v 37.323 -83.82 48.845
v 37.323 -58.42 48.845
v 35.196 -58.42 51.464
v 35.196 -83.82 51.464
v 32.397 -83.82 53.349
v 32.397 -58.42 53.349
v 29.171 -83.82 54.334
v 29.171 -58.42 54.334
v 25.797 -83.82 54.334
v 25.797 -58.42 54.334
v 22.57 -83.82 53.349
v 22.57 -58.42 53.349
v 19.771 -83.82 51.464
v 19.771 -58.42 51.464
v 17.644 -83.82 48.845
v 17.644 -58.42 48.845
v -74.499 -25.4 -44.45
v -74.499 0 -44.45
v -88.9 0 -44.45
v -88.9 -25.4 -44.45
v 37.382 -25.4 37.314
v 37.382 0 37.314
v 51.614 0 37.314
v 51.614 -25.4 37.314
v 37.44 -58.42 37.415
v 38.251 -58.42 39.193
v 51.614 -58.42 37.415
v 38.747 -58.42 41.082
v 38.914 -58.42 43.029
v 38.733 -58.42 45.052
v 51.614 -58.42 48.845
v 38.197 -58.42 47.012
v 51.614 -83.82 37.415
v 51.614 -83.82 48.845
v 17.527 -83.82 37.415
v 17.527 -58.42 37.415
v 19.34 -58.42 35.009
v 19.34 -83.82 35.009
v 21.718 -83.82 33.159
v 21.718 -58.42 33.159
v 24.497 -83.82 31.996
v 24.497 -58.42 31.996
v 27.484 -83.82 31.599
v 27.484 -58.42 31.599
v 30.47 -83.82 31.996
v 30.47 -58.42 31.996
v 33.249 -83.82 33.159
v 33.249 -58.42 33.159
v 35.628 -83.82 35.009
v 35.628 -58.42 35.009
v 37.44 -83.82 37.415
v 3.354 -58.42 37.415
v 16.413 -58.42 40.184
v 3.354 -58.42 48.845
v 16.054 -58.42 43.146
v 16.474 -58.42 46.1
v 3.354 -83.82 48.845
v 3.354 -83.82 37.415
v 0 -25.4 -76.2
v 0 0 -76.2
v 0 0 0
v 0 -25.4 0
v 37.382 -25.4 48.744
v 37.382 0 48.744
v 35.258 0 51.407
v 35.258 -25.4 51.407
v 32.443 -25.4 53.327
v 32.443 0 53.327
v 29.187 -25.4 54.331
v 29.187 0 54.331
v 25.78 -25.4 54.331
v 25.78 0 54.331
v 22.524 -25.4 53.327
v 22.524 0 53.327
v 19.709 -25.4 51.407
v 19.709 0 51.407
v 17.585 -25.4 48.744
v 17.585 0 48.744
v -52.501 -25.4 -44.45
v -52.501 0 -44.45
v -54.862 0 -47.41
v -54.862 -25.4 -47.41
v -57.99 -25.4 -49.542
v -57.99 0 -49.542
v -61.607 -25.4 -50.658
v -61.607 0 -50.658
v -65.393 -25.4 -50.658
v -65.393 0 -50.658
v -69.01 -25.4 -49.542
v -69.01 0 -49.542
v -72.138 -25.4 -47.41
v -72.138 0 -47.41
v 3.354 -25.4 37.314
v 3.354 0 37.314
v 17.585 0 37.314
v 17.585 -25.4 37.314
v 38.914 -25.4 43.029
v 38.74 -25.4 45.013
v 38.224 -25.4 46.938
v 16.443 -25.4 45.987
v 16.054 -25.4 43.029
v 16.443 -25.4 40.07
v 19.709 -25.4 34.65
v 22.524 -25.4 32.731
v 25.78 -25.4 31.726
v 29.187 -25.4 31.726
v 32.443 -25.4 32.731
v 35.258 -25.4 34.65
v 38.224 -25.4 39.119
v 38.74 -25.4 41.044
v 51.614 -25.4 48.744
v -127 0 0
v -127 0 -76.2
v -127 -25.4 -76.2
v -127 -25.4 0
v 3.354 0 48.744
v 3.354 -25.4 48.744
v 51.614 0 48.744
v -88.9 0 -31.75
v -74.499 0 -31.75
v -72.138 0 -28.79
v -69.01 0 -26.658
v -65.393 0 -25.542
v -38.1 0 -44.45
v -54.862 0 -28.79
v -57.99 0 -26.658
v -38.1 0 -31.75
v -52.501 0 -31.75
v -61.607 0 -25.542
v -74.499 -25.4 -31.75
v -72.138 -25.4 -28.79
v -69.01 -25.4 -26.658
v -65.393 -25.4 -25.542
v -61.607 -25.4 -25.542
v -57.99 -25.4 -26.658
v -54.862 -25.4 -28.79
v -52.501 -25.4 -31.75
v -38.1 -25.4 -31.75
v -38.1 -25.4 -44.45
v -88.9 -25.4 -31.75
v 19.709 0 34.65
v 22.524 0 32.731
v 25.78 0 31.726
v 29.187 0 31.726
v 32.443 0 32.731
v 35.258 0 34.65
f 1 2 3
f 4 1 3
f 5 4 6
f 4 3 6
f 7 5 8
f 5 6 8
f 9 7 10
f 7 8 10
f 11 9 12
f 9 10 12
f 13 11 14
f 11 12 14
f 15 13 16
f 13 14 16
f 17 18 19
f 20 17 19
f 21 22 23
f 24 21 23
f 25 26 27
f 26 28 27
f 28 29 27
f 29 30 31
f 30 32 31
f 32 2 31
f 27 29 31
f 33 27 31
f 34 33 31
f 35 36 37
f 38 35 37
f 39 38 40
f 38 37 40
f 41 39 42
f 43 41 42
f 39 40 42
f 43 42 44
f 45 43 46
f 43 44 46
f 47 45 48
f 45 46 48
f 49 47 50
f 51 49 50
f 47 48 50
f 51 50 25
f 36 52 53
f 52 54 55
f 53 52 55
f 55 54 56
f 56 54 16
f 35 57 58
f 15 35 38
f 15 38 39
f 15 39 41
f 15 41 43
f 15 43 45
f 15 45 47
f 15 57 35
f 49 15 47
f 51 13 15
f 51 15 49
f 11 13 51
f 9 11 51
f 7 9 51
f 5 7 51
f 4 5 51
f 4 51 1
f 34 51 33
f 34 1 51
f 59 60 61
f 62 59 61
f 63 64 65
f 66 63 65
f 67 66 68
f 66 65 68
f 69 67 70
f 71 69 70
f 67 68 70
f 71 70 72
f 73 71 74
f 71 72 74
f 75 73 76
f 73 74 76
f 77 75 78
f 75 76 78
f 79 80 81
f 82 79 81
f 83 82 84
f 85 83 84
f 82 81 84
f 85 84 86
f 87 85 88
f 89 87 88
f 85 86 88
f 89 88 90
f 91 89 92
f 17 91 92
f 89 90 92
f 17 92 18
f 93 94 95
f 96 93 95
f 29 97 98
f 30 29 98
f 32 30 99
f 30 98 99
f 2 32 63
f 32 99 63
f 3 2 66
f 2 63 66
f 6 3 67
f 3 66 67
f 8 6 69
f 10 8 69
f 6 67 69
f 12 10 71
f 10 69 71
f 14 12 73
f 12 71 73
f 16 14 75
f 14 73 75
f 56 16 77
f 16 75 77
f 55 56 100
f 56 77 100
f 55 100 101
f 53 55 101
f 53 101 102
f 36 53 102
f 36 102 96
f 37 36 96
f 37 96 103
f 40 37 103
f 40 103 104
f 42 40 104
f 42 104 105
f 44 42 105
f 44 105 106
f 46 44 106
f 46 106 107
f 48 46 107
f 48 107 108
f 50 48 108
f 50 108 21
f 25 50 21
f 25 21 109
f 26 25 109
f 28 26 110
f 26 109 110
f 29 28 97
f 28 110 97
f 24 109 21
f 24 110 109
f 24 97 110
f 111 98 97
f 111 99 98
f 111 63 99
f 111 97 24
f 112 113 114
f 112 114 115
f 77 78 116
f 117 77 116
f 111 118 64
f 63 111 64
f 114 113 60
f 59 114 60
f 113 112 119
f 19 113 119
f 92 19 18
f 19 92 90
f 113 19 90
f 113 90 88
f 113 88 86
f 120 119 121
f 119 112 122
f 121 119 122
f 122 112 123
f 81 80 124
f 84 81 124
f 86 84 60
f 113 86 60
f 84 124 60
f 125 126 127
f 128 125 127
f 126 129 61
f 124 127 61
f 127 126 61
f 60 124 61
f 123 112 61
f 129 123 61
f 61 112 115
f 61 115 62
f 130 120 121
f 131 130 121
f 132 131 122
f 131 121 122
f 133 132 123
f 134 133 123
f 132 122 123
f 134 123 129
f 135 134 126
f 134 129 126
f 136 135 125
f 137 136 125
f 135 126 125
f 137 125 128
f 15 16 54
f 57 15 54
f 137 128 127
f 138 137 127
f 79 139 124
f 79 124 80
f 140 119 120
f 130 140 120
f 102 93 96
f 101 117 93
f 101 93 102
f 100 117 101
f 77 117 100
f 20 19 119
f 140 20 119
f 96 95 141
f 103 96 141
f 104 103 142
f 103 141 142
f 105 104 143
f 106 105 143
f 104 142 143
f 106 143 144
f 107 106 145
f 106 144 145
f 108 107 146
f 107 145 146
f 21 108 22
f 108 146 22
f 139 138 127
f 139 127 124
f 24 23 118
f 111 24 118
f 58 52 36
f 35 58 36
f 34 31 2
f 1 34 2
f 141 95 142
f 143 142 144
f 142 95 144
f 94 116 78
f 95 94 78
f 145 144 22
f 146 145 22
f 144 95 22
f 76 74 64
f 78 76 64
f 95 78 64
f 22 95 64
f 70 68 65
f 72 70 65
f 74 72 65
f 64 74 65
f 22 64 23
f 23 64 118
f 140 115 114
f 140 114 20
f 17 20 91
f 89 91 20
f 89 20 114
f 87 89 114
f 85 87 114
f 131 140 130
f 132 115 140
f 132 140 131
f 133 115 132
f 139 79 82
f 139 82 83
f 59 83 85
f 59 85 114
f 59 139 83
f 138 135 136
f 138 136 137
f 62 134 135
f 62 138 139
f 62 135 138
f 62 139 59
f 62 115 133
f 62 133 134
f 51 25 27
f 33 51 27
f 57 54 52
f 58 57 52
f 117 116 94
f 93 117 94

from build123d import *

# Parameters (mm, degrees)
F0_W     = 127
F0_H     = 76.2
F1_DEPTH = 25.4
F2_DEPTH = 25.4
F4_DEPTH = 25.4
F5_R     = 11.43
F6_DEPTH = 33.02
F8_DEPTH = 25.4


with BuildPart() as f1:
    # F0 (on Front) → F1 (new body)
    with BuildSketch(Plane.XZ):
        with Locations((-63.5, -38.1)):
            Rectangle(F0_W, F0_H)
        with BuildLine():
            ThreePointArc((-74.4985226281, -31.75), (-63.5, -25.4), (-52.5014773719, -31.75))
            Line((-52.5014773719, -31.75), (-38.1, -31.75))
            Line((-38.1, -31.75), (-38.1, -44.45))
            Line((-38.1, -44.45), (-52.5014773719, -44.45))
            ThreePointArc((-52.5014773719, -44.45), (-63.5, -50.8), (-74.4985226281, -44.45))
            Line((-74.4985226281, -44.45), (-88.9, -44.45))
            Line((-88.9, -44.45), (-88.9, -31.75))
            Line((-88.9, -31.75), (-74.4985226281, -31.75))
        make_face(mode=Mode.SUBTRACT)
    extrude(amount=F1_DEPTH)

    # F0 (on Front) → F2 (join)
    with BuildSketch(Plane.XZ):
        with Locations((-63.5, -38.1)):
            Rectangle(F0_W, F0_H)
        with BuildLine():
            ThreePointArc((-74.4985226281, -31.75), (-63.5, -25.4), (-52.5014773719, -31.75))
            Line((-52.5014773719, -31.75), (-38.1, -31.75))
            Line((-38.1, -31.75), (-38.1, -44.45))
            Line((-38.1, -44.45), (-52.5014773719, -44.45))
            ThreePointArc((-52.5014773719, -44.45), (-63.5, -50.8), (-74.4985226281, -44.45))
            Line((-74.4985226281, -44.45), (-88.9, -44.45))
            Line((-88.9, -44.45), (-88.9, -31.75))
            Line((-88.9, -31.75), (-74.4985226281, -31.75))
        make_face(mode=Mode.SUBTRACT)
    extrude(amount=F2_DEPTH)


with BuildPart() as f4:
    # F3 (on Front) → F4 (new body)
    with BuildSketch(Plane.XZ):
        with BuildLine():
            ThreePointArc((37.3822628393, 48.7436810958), (38.5241246685, 45.9869827814), (38.913592474, 43.0286810958))
            ThreePointArc((38.913592474, 43.0286810958), (38.5241246685, 40.0703794103), (37.3822628393, 37.3136810958))
            Line((37.3822628393, 37.3136810958), (51.613592474, 37.3136810958))
            Line((51.613592474, 37.3136810958), (51.613592474, 48.7436810958))
            Line((51.613592474, 48.7436810958), (37.3822628393, 48.7436810958))
        make_face()
        with BuildLine():
            Line((17.5849221088, 48.7436810958), (37.3822628393, 48.7436810958))
            ThreePointArc((37.3822628393, 48.7436810958), (27.483592474, 54.4586810958), (17.5849221088, 48.7436810958))
        make_face()
        with BuildLine():
            ThreePointArc((17.5849221088, 37.3136810958), (27.483592474, 31.5986810958), (37.3822628393, 37.3136810958))
            Line((37.3822628393, 37.3136810958), (17.5849221088, 37.3136810958))
        make_face()
        with BuildLine():
            ThreePointArc((37.3822628393, 37.3136810958), (38.5241246685, 40.0703794103), (38.913592474, 43.0286810958))
            ThreePointArc((38.913592474, 43.0286810958), (38.5241246685, 45.9869827814), (37.3822628393, 48.7436810958))
            Line((37.3822628393, 48.7436810958), (17.5849221088, 48.7436810958))
            ThreePointArc((17.5849221088, 48.7436810958), (16.053592474, 43.0286810958), (17.5849221088, 37.3136810958))
            Line((17.5849221088, 37.3136810958), (37.3822628393, 37.3136810958))
        make_face()
        with BuildLine():
            ThreePointArc((17.5849221088, 37.3136810958), (16.053592474, 43.0286810958), (17.5849221088, 48.7436810958))
            Line((17.5849221088, 48.7436810958), (3.353592474, 48.7436810958))
            Line((3.353592474, 48.7436810958), (3.353592474, 37.3136810958))
            Line((3.353592474, 37.3136810958), (17.5849221088, 37.3136810958))
        make_face()
    extrude(amount=F4_DEPTH)

    # F5 (on face) → F6 (join)
    with BuildSketch(Plane.XZ.offset(25.4)):
        with Locations((27.483592474, 43.0286810958)):
            Circle(F5_R)
    extrude(amount=F6_DEPTH)

    # F7 (on face) → F8 (join)
    with BuildSketch(Plane.XZ.offset(58.42)):
        with BuildLine():
            Line((51.613592474, 48.845155419), (37.3229789614, 48.845155419))
            ThreePointArc((37.3229789614, 48.845155419), (38.5087701948, 46.0437028577), (38.913592474, 43.0286810958))
            ThreePointArc((38.913592474, 43.0286810958), (38.5390993046, 40.1268422444), (37.4401596272, 37.415155419))
            Line((37.4401596272, 37.415155419), (51.613592474, 37.415155419))
            Line((51.613592474, 37.415155419), (51.613592474, 48.845155419))
        make_face()
        with BuildLine():
            ThreePointArc((17.5270253208, 37.415155419), (16.0541930963, 43.1458556041), (17.6442059867, 48.845155419))
            Line((17.6442059867, 48.845155419), (3.353592474, 48.845155419))
            Line((3.353592474, 48.845155419), (3.353592474, 37.415155419))
            Line((3.353592474, 37.415155419), (17.5270253208, 37.415155419))
        make_face()
        with BuildLine():
            ThreePointArc((38.913592474, 43.0286810958), (38.5087701948, 46.0437028577), (37.3229789614, 48.845155419))
            ThreePointArc((37.3229789614, 48.845155419), (27.483592474, 54.4586810958), (17.6442059867, 48.845155419))
            ThreePointArc((17.6442059867, 48.845155419), (16.0541930963, 43.1458556041), (17.5270253208, 37.415155419))
            ThreePointArc((17.5270253208, 37.415155419), (27.483592474, 31.5986810958), (37.4401596272, 37.415155419))
            ThreePointArc((37.4401596272, 37.415155419), (38.5390993046, 40.1268422444), (38.913592474, 43.0286810958))
        make_face()
    extrude(amount=F8_DEPTH)


solid = Compound([f1.part, f4.part])
